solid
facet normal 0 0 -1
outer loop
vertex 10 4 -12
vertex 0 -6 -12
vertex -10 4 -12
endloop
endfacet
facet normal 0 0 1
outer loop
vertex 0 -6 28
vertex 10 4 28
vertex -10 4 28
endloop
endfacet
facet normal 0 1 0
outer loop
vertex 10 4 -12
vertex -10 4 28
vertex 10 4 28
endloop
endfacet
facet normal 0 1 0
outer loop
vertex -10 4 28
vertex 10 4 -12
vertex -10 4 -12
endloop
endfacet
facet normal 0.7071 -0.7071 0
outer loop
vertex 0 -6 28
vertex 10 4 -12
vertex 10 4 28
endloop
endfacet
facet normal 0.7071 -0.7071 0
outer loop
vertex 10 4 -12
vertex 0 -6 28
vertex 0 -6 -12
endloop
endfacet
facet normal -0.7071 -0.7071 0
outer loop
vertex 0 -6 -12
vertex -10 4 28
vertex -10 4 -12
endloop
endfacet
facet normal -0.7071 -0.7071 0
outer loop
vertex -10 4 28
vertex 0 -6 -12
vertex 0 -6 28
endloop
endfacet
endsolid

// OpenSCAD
use <../core/utils.scad>;

module mb_wedge(
    width = 10, 
    length = 5,
    depth = 2,
    

    face = "x-",
    offset = undef,
    mul = undef,

    color = "white",
    draw_together = false,
    debug = false
    
) {
    face = mb_face_to_int(face);
    axis = mb_face_to_axis(face);
    offset = mb_resolve_xyz(offset, default = [0, 0, 0]);
    mul = mb_resolve_xyz(mul, default = [1, 1, 1]);

    mul_length = mul[axis];

    rot = face == 1 ? [0, 0, 180] :
        face == 2 ? [0, 0, 90] :
        face == 3 ? [0, 0, -90] : 
        [0, 0, 0];

    z0 = (is_list(length) ? length[0] : is_num(length) ? -0.5 * length : 0) * mul_length; 
    z1 = (is_list(length) ? length[1] : is_num(length) ? 0.5 * length : 0) * mul_length;

    tri_h = width / 2;

    //x0 = -tri_h / 2;
    //x1 =  tri_h / 2;

    x0 = -depth;
    x1 = x0 + tri_h;

    y0 = -width / 2;
    y1 =  width / 2;

    points = [
        // z = -h/2
        [x0, y0, z0],
        [x0, y1, z0],
        [x1,  0, z0],

        // z = +h/2
        [x0, y0, z1],
        [x0, y1, z1],
        [x1,  0, z1]
    ];

    faces = [
        [0, 2, 1], // bottom
        [3, 4, 5], // top

        [0, 1, 4, 3],
        [1, 2, 5, 4],
        [2, 0, 3, 5]
    ];

    rotate(rot)
        polyhedron(points = points, faces = faces);
}

mb_wedge(depth = 4, width = 20, length = [-12, 28], face = 3);
